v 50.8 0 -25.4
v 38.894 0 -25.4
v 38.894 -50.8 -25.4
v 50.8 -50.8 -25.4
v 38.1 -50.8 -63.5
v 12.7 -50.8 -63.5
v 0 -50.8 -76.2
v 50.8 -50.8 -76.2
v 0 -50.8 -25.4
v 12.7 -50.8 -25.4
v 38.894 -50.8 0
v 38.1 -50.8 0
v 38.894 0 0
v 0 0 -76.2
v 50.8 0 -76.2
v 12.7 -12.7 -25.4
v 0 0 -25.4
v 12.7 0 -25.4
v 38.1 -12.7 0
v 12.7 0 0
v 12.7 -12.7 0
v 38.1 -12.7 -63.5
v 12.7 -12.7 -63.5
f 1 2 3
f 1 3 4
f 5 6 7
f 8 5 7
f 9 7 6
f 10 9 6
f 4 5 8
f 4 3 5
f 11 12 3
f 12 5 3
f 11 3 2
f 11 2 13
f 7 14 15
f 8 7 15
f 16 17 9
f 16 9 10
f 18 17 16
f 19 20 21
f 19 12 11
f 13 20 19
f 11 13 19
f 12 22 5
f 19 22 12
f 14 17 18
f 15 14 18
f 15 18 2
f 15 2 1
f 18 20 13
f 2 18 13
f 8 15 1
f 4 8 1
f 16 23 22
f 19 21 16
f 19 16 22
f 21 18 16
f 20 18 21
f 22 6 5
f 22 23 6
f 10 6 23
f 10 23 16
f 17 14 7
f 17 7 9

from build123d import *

# Parameters (mm, degrees)
F0_W     = 50.8
F0_H     = 76.2
F1_DEPTH = 50.8
F2_T     = -12.7
F3_W     = 12.7
F3_H     = 25.4
F4_DEPTH = 79.708762


with BuildPart() as f1:
    # F0 (on Front) → F1 (new body)
    with BuildSketch(Plane.XZ):
        with Locations((25.4, -38.1)):
            Rectangle(F0_W, F0_H)
    extrude(amount=F1_DEPTH)

    # F2
    f2_openings = [f1.faces().sort_by_distance(p)[0] for p in [
        (25.4, -50.8, -38.1),
        (25.4, -25.4, 0),
    ]]
    offset(amount=F2_T, openings=f2_openings)

    # F3 (on Front) → F4 (cut)
    with BuildSketch(Plane.XZ):
        with Locations((6.35, -12.7)):
            Rectangle(F3_W, F3_H)
        with Locations((45.243796, -12.7)):
            Rectangle(F3_W, F3_H)
    extrude(amount=F4_DEPTH, mode=Mode.SUBTRACT)


solid = f1.part
